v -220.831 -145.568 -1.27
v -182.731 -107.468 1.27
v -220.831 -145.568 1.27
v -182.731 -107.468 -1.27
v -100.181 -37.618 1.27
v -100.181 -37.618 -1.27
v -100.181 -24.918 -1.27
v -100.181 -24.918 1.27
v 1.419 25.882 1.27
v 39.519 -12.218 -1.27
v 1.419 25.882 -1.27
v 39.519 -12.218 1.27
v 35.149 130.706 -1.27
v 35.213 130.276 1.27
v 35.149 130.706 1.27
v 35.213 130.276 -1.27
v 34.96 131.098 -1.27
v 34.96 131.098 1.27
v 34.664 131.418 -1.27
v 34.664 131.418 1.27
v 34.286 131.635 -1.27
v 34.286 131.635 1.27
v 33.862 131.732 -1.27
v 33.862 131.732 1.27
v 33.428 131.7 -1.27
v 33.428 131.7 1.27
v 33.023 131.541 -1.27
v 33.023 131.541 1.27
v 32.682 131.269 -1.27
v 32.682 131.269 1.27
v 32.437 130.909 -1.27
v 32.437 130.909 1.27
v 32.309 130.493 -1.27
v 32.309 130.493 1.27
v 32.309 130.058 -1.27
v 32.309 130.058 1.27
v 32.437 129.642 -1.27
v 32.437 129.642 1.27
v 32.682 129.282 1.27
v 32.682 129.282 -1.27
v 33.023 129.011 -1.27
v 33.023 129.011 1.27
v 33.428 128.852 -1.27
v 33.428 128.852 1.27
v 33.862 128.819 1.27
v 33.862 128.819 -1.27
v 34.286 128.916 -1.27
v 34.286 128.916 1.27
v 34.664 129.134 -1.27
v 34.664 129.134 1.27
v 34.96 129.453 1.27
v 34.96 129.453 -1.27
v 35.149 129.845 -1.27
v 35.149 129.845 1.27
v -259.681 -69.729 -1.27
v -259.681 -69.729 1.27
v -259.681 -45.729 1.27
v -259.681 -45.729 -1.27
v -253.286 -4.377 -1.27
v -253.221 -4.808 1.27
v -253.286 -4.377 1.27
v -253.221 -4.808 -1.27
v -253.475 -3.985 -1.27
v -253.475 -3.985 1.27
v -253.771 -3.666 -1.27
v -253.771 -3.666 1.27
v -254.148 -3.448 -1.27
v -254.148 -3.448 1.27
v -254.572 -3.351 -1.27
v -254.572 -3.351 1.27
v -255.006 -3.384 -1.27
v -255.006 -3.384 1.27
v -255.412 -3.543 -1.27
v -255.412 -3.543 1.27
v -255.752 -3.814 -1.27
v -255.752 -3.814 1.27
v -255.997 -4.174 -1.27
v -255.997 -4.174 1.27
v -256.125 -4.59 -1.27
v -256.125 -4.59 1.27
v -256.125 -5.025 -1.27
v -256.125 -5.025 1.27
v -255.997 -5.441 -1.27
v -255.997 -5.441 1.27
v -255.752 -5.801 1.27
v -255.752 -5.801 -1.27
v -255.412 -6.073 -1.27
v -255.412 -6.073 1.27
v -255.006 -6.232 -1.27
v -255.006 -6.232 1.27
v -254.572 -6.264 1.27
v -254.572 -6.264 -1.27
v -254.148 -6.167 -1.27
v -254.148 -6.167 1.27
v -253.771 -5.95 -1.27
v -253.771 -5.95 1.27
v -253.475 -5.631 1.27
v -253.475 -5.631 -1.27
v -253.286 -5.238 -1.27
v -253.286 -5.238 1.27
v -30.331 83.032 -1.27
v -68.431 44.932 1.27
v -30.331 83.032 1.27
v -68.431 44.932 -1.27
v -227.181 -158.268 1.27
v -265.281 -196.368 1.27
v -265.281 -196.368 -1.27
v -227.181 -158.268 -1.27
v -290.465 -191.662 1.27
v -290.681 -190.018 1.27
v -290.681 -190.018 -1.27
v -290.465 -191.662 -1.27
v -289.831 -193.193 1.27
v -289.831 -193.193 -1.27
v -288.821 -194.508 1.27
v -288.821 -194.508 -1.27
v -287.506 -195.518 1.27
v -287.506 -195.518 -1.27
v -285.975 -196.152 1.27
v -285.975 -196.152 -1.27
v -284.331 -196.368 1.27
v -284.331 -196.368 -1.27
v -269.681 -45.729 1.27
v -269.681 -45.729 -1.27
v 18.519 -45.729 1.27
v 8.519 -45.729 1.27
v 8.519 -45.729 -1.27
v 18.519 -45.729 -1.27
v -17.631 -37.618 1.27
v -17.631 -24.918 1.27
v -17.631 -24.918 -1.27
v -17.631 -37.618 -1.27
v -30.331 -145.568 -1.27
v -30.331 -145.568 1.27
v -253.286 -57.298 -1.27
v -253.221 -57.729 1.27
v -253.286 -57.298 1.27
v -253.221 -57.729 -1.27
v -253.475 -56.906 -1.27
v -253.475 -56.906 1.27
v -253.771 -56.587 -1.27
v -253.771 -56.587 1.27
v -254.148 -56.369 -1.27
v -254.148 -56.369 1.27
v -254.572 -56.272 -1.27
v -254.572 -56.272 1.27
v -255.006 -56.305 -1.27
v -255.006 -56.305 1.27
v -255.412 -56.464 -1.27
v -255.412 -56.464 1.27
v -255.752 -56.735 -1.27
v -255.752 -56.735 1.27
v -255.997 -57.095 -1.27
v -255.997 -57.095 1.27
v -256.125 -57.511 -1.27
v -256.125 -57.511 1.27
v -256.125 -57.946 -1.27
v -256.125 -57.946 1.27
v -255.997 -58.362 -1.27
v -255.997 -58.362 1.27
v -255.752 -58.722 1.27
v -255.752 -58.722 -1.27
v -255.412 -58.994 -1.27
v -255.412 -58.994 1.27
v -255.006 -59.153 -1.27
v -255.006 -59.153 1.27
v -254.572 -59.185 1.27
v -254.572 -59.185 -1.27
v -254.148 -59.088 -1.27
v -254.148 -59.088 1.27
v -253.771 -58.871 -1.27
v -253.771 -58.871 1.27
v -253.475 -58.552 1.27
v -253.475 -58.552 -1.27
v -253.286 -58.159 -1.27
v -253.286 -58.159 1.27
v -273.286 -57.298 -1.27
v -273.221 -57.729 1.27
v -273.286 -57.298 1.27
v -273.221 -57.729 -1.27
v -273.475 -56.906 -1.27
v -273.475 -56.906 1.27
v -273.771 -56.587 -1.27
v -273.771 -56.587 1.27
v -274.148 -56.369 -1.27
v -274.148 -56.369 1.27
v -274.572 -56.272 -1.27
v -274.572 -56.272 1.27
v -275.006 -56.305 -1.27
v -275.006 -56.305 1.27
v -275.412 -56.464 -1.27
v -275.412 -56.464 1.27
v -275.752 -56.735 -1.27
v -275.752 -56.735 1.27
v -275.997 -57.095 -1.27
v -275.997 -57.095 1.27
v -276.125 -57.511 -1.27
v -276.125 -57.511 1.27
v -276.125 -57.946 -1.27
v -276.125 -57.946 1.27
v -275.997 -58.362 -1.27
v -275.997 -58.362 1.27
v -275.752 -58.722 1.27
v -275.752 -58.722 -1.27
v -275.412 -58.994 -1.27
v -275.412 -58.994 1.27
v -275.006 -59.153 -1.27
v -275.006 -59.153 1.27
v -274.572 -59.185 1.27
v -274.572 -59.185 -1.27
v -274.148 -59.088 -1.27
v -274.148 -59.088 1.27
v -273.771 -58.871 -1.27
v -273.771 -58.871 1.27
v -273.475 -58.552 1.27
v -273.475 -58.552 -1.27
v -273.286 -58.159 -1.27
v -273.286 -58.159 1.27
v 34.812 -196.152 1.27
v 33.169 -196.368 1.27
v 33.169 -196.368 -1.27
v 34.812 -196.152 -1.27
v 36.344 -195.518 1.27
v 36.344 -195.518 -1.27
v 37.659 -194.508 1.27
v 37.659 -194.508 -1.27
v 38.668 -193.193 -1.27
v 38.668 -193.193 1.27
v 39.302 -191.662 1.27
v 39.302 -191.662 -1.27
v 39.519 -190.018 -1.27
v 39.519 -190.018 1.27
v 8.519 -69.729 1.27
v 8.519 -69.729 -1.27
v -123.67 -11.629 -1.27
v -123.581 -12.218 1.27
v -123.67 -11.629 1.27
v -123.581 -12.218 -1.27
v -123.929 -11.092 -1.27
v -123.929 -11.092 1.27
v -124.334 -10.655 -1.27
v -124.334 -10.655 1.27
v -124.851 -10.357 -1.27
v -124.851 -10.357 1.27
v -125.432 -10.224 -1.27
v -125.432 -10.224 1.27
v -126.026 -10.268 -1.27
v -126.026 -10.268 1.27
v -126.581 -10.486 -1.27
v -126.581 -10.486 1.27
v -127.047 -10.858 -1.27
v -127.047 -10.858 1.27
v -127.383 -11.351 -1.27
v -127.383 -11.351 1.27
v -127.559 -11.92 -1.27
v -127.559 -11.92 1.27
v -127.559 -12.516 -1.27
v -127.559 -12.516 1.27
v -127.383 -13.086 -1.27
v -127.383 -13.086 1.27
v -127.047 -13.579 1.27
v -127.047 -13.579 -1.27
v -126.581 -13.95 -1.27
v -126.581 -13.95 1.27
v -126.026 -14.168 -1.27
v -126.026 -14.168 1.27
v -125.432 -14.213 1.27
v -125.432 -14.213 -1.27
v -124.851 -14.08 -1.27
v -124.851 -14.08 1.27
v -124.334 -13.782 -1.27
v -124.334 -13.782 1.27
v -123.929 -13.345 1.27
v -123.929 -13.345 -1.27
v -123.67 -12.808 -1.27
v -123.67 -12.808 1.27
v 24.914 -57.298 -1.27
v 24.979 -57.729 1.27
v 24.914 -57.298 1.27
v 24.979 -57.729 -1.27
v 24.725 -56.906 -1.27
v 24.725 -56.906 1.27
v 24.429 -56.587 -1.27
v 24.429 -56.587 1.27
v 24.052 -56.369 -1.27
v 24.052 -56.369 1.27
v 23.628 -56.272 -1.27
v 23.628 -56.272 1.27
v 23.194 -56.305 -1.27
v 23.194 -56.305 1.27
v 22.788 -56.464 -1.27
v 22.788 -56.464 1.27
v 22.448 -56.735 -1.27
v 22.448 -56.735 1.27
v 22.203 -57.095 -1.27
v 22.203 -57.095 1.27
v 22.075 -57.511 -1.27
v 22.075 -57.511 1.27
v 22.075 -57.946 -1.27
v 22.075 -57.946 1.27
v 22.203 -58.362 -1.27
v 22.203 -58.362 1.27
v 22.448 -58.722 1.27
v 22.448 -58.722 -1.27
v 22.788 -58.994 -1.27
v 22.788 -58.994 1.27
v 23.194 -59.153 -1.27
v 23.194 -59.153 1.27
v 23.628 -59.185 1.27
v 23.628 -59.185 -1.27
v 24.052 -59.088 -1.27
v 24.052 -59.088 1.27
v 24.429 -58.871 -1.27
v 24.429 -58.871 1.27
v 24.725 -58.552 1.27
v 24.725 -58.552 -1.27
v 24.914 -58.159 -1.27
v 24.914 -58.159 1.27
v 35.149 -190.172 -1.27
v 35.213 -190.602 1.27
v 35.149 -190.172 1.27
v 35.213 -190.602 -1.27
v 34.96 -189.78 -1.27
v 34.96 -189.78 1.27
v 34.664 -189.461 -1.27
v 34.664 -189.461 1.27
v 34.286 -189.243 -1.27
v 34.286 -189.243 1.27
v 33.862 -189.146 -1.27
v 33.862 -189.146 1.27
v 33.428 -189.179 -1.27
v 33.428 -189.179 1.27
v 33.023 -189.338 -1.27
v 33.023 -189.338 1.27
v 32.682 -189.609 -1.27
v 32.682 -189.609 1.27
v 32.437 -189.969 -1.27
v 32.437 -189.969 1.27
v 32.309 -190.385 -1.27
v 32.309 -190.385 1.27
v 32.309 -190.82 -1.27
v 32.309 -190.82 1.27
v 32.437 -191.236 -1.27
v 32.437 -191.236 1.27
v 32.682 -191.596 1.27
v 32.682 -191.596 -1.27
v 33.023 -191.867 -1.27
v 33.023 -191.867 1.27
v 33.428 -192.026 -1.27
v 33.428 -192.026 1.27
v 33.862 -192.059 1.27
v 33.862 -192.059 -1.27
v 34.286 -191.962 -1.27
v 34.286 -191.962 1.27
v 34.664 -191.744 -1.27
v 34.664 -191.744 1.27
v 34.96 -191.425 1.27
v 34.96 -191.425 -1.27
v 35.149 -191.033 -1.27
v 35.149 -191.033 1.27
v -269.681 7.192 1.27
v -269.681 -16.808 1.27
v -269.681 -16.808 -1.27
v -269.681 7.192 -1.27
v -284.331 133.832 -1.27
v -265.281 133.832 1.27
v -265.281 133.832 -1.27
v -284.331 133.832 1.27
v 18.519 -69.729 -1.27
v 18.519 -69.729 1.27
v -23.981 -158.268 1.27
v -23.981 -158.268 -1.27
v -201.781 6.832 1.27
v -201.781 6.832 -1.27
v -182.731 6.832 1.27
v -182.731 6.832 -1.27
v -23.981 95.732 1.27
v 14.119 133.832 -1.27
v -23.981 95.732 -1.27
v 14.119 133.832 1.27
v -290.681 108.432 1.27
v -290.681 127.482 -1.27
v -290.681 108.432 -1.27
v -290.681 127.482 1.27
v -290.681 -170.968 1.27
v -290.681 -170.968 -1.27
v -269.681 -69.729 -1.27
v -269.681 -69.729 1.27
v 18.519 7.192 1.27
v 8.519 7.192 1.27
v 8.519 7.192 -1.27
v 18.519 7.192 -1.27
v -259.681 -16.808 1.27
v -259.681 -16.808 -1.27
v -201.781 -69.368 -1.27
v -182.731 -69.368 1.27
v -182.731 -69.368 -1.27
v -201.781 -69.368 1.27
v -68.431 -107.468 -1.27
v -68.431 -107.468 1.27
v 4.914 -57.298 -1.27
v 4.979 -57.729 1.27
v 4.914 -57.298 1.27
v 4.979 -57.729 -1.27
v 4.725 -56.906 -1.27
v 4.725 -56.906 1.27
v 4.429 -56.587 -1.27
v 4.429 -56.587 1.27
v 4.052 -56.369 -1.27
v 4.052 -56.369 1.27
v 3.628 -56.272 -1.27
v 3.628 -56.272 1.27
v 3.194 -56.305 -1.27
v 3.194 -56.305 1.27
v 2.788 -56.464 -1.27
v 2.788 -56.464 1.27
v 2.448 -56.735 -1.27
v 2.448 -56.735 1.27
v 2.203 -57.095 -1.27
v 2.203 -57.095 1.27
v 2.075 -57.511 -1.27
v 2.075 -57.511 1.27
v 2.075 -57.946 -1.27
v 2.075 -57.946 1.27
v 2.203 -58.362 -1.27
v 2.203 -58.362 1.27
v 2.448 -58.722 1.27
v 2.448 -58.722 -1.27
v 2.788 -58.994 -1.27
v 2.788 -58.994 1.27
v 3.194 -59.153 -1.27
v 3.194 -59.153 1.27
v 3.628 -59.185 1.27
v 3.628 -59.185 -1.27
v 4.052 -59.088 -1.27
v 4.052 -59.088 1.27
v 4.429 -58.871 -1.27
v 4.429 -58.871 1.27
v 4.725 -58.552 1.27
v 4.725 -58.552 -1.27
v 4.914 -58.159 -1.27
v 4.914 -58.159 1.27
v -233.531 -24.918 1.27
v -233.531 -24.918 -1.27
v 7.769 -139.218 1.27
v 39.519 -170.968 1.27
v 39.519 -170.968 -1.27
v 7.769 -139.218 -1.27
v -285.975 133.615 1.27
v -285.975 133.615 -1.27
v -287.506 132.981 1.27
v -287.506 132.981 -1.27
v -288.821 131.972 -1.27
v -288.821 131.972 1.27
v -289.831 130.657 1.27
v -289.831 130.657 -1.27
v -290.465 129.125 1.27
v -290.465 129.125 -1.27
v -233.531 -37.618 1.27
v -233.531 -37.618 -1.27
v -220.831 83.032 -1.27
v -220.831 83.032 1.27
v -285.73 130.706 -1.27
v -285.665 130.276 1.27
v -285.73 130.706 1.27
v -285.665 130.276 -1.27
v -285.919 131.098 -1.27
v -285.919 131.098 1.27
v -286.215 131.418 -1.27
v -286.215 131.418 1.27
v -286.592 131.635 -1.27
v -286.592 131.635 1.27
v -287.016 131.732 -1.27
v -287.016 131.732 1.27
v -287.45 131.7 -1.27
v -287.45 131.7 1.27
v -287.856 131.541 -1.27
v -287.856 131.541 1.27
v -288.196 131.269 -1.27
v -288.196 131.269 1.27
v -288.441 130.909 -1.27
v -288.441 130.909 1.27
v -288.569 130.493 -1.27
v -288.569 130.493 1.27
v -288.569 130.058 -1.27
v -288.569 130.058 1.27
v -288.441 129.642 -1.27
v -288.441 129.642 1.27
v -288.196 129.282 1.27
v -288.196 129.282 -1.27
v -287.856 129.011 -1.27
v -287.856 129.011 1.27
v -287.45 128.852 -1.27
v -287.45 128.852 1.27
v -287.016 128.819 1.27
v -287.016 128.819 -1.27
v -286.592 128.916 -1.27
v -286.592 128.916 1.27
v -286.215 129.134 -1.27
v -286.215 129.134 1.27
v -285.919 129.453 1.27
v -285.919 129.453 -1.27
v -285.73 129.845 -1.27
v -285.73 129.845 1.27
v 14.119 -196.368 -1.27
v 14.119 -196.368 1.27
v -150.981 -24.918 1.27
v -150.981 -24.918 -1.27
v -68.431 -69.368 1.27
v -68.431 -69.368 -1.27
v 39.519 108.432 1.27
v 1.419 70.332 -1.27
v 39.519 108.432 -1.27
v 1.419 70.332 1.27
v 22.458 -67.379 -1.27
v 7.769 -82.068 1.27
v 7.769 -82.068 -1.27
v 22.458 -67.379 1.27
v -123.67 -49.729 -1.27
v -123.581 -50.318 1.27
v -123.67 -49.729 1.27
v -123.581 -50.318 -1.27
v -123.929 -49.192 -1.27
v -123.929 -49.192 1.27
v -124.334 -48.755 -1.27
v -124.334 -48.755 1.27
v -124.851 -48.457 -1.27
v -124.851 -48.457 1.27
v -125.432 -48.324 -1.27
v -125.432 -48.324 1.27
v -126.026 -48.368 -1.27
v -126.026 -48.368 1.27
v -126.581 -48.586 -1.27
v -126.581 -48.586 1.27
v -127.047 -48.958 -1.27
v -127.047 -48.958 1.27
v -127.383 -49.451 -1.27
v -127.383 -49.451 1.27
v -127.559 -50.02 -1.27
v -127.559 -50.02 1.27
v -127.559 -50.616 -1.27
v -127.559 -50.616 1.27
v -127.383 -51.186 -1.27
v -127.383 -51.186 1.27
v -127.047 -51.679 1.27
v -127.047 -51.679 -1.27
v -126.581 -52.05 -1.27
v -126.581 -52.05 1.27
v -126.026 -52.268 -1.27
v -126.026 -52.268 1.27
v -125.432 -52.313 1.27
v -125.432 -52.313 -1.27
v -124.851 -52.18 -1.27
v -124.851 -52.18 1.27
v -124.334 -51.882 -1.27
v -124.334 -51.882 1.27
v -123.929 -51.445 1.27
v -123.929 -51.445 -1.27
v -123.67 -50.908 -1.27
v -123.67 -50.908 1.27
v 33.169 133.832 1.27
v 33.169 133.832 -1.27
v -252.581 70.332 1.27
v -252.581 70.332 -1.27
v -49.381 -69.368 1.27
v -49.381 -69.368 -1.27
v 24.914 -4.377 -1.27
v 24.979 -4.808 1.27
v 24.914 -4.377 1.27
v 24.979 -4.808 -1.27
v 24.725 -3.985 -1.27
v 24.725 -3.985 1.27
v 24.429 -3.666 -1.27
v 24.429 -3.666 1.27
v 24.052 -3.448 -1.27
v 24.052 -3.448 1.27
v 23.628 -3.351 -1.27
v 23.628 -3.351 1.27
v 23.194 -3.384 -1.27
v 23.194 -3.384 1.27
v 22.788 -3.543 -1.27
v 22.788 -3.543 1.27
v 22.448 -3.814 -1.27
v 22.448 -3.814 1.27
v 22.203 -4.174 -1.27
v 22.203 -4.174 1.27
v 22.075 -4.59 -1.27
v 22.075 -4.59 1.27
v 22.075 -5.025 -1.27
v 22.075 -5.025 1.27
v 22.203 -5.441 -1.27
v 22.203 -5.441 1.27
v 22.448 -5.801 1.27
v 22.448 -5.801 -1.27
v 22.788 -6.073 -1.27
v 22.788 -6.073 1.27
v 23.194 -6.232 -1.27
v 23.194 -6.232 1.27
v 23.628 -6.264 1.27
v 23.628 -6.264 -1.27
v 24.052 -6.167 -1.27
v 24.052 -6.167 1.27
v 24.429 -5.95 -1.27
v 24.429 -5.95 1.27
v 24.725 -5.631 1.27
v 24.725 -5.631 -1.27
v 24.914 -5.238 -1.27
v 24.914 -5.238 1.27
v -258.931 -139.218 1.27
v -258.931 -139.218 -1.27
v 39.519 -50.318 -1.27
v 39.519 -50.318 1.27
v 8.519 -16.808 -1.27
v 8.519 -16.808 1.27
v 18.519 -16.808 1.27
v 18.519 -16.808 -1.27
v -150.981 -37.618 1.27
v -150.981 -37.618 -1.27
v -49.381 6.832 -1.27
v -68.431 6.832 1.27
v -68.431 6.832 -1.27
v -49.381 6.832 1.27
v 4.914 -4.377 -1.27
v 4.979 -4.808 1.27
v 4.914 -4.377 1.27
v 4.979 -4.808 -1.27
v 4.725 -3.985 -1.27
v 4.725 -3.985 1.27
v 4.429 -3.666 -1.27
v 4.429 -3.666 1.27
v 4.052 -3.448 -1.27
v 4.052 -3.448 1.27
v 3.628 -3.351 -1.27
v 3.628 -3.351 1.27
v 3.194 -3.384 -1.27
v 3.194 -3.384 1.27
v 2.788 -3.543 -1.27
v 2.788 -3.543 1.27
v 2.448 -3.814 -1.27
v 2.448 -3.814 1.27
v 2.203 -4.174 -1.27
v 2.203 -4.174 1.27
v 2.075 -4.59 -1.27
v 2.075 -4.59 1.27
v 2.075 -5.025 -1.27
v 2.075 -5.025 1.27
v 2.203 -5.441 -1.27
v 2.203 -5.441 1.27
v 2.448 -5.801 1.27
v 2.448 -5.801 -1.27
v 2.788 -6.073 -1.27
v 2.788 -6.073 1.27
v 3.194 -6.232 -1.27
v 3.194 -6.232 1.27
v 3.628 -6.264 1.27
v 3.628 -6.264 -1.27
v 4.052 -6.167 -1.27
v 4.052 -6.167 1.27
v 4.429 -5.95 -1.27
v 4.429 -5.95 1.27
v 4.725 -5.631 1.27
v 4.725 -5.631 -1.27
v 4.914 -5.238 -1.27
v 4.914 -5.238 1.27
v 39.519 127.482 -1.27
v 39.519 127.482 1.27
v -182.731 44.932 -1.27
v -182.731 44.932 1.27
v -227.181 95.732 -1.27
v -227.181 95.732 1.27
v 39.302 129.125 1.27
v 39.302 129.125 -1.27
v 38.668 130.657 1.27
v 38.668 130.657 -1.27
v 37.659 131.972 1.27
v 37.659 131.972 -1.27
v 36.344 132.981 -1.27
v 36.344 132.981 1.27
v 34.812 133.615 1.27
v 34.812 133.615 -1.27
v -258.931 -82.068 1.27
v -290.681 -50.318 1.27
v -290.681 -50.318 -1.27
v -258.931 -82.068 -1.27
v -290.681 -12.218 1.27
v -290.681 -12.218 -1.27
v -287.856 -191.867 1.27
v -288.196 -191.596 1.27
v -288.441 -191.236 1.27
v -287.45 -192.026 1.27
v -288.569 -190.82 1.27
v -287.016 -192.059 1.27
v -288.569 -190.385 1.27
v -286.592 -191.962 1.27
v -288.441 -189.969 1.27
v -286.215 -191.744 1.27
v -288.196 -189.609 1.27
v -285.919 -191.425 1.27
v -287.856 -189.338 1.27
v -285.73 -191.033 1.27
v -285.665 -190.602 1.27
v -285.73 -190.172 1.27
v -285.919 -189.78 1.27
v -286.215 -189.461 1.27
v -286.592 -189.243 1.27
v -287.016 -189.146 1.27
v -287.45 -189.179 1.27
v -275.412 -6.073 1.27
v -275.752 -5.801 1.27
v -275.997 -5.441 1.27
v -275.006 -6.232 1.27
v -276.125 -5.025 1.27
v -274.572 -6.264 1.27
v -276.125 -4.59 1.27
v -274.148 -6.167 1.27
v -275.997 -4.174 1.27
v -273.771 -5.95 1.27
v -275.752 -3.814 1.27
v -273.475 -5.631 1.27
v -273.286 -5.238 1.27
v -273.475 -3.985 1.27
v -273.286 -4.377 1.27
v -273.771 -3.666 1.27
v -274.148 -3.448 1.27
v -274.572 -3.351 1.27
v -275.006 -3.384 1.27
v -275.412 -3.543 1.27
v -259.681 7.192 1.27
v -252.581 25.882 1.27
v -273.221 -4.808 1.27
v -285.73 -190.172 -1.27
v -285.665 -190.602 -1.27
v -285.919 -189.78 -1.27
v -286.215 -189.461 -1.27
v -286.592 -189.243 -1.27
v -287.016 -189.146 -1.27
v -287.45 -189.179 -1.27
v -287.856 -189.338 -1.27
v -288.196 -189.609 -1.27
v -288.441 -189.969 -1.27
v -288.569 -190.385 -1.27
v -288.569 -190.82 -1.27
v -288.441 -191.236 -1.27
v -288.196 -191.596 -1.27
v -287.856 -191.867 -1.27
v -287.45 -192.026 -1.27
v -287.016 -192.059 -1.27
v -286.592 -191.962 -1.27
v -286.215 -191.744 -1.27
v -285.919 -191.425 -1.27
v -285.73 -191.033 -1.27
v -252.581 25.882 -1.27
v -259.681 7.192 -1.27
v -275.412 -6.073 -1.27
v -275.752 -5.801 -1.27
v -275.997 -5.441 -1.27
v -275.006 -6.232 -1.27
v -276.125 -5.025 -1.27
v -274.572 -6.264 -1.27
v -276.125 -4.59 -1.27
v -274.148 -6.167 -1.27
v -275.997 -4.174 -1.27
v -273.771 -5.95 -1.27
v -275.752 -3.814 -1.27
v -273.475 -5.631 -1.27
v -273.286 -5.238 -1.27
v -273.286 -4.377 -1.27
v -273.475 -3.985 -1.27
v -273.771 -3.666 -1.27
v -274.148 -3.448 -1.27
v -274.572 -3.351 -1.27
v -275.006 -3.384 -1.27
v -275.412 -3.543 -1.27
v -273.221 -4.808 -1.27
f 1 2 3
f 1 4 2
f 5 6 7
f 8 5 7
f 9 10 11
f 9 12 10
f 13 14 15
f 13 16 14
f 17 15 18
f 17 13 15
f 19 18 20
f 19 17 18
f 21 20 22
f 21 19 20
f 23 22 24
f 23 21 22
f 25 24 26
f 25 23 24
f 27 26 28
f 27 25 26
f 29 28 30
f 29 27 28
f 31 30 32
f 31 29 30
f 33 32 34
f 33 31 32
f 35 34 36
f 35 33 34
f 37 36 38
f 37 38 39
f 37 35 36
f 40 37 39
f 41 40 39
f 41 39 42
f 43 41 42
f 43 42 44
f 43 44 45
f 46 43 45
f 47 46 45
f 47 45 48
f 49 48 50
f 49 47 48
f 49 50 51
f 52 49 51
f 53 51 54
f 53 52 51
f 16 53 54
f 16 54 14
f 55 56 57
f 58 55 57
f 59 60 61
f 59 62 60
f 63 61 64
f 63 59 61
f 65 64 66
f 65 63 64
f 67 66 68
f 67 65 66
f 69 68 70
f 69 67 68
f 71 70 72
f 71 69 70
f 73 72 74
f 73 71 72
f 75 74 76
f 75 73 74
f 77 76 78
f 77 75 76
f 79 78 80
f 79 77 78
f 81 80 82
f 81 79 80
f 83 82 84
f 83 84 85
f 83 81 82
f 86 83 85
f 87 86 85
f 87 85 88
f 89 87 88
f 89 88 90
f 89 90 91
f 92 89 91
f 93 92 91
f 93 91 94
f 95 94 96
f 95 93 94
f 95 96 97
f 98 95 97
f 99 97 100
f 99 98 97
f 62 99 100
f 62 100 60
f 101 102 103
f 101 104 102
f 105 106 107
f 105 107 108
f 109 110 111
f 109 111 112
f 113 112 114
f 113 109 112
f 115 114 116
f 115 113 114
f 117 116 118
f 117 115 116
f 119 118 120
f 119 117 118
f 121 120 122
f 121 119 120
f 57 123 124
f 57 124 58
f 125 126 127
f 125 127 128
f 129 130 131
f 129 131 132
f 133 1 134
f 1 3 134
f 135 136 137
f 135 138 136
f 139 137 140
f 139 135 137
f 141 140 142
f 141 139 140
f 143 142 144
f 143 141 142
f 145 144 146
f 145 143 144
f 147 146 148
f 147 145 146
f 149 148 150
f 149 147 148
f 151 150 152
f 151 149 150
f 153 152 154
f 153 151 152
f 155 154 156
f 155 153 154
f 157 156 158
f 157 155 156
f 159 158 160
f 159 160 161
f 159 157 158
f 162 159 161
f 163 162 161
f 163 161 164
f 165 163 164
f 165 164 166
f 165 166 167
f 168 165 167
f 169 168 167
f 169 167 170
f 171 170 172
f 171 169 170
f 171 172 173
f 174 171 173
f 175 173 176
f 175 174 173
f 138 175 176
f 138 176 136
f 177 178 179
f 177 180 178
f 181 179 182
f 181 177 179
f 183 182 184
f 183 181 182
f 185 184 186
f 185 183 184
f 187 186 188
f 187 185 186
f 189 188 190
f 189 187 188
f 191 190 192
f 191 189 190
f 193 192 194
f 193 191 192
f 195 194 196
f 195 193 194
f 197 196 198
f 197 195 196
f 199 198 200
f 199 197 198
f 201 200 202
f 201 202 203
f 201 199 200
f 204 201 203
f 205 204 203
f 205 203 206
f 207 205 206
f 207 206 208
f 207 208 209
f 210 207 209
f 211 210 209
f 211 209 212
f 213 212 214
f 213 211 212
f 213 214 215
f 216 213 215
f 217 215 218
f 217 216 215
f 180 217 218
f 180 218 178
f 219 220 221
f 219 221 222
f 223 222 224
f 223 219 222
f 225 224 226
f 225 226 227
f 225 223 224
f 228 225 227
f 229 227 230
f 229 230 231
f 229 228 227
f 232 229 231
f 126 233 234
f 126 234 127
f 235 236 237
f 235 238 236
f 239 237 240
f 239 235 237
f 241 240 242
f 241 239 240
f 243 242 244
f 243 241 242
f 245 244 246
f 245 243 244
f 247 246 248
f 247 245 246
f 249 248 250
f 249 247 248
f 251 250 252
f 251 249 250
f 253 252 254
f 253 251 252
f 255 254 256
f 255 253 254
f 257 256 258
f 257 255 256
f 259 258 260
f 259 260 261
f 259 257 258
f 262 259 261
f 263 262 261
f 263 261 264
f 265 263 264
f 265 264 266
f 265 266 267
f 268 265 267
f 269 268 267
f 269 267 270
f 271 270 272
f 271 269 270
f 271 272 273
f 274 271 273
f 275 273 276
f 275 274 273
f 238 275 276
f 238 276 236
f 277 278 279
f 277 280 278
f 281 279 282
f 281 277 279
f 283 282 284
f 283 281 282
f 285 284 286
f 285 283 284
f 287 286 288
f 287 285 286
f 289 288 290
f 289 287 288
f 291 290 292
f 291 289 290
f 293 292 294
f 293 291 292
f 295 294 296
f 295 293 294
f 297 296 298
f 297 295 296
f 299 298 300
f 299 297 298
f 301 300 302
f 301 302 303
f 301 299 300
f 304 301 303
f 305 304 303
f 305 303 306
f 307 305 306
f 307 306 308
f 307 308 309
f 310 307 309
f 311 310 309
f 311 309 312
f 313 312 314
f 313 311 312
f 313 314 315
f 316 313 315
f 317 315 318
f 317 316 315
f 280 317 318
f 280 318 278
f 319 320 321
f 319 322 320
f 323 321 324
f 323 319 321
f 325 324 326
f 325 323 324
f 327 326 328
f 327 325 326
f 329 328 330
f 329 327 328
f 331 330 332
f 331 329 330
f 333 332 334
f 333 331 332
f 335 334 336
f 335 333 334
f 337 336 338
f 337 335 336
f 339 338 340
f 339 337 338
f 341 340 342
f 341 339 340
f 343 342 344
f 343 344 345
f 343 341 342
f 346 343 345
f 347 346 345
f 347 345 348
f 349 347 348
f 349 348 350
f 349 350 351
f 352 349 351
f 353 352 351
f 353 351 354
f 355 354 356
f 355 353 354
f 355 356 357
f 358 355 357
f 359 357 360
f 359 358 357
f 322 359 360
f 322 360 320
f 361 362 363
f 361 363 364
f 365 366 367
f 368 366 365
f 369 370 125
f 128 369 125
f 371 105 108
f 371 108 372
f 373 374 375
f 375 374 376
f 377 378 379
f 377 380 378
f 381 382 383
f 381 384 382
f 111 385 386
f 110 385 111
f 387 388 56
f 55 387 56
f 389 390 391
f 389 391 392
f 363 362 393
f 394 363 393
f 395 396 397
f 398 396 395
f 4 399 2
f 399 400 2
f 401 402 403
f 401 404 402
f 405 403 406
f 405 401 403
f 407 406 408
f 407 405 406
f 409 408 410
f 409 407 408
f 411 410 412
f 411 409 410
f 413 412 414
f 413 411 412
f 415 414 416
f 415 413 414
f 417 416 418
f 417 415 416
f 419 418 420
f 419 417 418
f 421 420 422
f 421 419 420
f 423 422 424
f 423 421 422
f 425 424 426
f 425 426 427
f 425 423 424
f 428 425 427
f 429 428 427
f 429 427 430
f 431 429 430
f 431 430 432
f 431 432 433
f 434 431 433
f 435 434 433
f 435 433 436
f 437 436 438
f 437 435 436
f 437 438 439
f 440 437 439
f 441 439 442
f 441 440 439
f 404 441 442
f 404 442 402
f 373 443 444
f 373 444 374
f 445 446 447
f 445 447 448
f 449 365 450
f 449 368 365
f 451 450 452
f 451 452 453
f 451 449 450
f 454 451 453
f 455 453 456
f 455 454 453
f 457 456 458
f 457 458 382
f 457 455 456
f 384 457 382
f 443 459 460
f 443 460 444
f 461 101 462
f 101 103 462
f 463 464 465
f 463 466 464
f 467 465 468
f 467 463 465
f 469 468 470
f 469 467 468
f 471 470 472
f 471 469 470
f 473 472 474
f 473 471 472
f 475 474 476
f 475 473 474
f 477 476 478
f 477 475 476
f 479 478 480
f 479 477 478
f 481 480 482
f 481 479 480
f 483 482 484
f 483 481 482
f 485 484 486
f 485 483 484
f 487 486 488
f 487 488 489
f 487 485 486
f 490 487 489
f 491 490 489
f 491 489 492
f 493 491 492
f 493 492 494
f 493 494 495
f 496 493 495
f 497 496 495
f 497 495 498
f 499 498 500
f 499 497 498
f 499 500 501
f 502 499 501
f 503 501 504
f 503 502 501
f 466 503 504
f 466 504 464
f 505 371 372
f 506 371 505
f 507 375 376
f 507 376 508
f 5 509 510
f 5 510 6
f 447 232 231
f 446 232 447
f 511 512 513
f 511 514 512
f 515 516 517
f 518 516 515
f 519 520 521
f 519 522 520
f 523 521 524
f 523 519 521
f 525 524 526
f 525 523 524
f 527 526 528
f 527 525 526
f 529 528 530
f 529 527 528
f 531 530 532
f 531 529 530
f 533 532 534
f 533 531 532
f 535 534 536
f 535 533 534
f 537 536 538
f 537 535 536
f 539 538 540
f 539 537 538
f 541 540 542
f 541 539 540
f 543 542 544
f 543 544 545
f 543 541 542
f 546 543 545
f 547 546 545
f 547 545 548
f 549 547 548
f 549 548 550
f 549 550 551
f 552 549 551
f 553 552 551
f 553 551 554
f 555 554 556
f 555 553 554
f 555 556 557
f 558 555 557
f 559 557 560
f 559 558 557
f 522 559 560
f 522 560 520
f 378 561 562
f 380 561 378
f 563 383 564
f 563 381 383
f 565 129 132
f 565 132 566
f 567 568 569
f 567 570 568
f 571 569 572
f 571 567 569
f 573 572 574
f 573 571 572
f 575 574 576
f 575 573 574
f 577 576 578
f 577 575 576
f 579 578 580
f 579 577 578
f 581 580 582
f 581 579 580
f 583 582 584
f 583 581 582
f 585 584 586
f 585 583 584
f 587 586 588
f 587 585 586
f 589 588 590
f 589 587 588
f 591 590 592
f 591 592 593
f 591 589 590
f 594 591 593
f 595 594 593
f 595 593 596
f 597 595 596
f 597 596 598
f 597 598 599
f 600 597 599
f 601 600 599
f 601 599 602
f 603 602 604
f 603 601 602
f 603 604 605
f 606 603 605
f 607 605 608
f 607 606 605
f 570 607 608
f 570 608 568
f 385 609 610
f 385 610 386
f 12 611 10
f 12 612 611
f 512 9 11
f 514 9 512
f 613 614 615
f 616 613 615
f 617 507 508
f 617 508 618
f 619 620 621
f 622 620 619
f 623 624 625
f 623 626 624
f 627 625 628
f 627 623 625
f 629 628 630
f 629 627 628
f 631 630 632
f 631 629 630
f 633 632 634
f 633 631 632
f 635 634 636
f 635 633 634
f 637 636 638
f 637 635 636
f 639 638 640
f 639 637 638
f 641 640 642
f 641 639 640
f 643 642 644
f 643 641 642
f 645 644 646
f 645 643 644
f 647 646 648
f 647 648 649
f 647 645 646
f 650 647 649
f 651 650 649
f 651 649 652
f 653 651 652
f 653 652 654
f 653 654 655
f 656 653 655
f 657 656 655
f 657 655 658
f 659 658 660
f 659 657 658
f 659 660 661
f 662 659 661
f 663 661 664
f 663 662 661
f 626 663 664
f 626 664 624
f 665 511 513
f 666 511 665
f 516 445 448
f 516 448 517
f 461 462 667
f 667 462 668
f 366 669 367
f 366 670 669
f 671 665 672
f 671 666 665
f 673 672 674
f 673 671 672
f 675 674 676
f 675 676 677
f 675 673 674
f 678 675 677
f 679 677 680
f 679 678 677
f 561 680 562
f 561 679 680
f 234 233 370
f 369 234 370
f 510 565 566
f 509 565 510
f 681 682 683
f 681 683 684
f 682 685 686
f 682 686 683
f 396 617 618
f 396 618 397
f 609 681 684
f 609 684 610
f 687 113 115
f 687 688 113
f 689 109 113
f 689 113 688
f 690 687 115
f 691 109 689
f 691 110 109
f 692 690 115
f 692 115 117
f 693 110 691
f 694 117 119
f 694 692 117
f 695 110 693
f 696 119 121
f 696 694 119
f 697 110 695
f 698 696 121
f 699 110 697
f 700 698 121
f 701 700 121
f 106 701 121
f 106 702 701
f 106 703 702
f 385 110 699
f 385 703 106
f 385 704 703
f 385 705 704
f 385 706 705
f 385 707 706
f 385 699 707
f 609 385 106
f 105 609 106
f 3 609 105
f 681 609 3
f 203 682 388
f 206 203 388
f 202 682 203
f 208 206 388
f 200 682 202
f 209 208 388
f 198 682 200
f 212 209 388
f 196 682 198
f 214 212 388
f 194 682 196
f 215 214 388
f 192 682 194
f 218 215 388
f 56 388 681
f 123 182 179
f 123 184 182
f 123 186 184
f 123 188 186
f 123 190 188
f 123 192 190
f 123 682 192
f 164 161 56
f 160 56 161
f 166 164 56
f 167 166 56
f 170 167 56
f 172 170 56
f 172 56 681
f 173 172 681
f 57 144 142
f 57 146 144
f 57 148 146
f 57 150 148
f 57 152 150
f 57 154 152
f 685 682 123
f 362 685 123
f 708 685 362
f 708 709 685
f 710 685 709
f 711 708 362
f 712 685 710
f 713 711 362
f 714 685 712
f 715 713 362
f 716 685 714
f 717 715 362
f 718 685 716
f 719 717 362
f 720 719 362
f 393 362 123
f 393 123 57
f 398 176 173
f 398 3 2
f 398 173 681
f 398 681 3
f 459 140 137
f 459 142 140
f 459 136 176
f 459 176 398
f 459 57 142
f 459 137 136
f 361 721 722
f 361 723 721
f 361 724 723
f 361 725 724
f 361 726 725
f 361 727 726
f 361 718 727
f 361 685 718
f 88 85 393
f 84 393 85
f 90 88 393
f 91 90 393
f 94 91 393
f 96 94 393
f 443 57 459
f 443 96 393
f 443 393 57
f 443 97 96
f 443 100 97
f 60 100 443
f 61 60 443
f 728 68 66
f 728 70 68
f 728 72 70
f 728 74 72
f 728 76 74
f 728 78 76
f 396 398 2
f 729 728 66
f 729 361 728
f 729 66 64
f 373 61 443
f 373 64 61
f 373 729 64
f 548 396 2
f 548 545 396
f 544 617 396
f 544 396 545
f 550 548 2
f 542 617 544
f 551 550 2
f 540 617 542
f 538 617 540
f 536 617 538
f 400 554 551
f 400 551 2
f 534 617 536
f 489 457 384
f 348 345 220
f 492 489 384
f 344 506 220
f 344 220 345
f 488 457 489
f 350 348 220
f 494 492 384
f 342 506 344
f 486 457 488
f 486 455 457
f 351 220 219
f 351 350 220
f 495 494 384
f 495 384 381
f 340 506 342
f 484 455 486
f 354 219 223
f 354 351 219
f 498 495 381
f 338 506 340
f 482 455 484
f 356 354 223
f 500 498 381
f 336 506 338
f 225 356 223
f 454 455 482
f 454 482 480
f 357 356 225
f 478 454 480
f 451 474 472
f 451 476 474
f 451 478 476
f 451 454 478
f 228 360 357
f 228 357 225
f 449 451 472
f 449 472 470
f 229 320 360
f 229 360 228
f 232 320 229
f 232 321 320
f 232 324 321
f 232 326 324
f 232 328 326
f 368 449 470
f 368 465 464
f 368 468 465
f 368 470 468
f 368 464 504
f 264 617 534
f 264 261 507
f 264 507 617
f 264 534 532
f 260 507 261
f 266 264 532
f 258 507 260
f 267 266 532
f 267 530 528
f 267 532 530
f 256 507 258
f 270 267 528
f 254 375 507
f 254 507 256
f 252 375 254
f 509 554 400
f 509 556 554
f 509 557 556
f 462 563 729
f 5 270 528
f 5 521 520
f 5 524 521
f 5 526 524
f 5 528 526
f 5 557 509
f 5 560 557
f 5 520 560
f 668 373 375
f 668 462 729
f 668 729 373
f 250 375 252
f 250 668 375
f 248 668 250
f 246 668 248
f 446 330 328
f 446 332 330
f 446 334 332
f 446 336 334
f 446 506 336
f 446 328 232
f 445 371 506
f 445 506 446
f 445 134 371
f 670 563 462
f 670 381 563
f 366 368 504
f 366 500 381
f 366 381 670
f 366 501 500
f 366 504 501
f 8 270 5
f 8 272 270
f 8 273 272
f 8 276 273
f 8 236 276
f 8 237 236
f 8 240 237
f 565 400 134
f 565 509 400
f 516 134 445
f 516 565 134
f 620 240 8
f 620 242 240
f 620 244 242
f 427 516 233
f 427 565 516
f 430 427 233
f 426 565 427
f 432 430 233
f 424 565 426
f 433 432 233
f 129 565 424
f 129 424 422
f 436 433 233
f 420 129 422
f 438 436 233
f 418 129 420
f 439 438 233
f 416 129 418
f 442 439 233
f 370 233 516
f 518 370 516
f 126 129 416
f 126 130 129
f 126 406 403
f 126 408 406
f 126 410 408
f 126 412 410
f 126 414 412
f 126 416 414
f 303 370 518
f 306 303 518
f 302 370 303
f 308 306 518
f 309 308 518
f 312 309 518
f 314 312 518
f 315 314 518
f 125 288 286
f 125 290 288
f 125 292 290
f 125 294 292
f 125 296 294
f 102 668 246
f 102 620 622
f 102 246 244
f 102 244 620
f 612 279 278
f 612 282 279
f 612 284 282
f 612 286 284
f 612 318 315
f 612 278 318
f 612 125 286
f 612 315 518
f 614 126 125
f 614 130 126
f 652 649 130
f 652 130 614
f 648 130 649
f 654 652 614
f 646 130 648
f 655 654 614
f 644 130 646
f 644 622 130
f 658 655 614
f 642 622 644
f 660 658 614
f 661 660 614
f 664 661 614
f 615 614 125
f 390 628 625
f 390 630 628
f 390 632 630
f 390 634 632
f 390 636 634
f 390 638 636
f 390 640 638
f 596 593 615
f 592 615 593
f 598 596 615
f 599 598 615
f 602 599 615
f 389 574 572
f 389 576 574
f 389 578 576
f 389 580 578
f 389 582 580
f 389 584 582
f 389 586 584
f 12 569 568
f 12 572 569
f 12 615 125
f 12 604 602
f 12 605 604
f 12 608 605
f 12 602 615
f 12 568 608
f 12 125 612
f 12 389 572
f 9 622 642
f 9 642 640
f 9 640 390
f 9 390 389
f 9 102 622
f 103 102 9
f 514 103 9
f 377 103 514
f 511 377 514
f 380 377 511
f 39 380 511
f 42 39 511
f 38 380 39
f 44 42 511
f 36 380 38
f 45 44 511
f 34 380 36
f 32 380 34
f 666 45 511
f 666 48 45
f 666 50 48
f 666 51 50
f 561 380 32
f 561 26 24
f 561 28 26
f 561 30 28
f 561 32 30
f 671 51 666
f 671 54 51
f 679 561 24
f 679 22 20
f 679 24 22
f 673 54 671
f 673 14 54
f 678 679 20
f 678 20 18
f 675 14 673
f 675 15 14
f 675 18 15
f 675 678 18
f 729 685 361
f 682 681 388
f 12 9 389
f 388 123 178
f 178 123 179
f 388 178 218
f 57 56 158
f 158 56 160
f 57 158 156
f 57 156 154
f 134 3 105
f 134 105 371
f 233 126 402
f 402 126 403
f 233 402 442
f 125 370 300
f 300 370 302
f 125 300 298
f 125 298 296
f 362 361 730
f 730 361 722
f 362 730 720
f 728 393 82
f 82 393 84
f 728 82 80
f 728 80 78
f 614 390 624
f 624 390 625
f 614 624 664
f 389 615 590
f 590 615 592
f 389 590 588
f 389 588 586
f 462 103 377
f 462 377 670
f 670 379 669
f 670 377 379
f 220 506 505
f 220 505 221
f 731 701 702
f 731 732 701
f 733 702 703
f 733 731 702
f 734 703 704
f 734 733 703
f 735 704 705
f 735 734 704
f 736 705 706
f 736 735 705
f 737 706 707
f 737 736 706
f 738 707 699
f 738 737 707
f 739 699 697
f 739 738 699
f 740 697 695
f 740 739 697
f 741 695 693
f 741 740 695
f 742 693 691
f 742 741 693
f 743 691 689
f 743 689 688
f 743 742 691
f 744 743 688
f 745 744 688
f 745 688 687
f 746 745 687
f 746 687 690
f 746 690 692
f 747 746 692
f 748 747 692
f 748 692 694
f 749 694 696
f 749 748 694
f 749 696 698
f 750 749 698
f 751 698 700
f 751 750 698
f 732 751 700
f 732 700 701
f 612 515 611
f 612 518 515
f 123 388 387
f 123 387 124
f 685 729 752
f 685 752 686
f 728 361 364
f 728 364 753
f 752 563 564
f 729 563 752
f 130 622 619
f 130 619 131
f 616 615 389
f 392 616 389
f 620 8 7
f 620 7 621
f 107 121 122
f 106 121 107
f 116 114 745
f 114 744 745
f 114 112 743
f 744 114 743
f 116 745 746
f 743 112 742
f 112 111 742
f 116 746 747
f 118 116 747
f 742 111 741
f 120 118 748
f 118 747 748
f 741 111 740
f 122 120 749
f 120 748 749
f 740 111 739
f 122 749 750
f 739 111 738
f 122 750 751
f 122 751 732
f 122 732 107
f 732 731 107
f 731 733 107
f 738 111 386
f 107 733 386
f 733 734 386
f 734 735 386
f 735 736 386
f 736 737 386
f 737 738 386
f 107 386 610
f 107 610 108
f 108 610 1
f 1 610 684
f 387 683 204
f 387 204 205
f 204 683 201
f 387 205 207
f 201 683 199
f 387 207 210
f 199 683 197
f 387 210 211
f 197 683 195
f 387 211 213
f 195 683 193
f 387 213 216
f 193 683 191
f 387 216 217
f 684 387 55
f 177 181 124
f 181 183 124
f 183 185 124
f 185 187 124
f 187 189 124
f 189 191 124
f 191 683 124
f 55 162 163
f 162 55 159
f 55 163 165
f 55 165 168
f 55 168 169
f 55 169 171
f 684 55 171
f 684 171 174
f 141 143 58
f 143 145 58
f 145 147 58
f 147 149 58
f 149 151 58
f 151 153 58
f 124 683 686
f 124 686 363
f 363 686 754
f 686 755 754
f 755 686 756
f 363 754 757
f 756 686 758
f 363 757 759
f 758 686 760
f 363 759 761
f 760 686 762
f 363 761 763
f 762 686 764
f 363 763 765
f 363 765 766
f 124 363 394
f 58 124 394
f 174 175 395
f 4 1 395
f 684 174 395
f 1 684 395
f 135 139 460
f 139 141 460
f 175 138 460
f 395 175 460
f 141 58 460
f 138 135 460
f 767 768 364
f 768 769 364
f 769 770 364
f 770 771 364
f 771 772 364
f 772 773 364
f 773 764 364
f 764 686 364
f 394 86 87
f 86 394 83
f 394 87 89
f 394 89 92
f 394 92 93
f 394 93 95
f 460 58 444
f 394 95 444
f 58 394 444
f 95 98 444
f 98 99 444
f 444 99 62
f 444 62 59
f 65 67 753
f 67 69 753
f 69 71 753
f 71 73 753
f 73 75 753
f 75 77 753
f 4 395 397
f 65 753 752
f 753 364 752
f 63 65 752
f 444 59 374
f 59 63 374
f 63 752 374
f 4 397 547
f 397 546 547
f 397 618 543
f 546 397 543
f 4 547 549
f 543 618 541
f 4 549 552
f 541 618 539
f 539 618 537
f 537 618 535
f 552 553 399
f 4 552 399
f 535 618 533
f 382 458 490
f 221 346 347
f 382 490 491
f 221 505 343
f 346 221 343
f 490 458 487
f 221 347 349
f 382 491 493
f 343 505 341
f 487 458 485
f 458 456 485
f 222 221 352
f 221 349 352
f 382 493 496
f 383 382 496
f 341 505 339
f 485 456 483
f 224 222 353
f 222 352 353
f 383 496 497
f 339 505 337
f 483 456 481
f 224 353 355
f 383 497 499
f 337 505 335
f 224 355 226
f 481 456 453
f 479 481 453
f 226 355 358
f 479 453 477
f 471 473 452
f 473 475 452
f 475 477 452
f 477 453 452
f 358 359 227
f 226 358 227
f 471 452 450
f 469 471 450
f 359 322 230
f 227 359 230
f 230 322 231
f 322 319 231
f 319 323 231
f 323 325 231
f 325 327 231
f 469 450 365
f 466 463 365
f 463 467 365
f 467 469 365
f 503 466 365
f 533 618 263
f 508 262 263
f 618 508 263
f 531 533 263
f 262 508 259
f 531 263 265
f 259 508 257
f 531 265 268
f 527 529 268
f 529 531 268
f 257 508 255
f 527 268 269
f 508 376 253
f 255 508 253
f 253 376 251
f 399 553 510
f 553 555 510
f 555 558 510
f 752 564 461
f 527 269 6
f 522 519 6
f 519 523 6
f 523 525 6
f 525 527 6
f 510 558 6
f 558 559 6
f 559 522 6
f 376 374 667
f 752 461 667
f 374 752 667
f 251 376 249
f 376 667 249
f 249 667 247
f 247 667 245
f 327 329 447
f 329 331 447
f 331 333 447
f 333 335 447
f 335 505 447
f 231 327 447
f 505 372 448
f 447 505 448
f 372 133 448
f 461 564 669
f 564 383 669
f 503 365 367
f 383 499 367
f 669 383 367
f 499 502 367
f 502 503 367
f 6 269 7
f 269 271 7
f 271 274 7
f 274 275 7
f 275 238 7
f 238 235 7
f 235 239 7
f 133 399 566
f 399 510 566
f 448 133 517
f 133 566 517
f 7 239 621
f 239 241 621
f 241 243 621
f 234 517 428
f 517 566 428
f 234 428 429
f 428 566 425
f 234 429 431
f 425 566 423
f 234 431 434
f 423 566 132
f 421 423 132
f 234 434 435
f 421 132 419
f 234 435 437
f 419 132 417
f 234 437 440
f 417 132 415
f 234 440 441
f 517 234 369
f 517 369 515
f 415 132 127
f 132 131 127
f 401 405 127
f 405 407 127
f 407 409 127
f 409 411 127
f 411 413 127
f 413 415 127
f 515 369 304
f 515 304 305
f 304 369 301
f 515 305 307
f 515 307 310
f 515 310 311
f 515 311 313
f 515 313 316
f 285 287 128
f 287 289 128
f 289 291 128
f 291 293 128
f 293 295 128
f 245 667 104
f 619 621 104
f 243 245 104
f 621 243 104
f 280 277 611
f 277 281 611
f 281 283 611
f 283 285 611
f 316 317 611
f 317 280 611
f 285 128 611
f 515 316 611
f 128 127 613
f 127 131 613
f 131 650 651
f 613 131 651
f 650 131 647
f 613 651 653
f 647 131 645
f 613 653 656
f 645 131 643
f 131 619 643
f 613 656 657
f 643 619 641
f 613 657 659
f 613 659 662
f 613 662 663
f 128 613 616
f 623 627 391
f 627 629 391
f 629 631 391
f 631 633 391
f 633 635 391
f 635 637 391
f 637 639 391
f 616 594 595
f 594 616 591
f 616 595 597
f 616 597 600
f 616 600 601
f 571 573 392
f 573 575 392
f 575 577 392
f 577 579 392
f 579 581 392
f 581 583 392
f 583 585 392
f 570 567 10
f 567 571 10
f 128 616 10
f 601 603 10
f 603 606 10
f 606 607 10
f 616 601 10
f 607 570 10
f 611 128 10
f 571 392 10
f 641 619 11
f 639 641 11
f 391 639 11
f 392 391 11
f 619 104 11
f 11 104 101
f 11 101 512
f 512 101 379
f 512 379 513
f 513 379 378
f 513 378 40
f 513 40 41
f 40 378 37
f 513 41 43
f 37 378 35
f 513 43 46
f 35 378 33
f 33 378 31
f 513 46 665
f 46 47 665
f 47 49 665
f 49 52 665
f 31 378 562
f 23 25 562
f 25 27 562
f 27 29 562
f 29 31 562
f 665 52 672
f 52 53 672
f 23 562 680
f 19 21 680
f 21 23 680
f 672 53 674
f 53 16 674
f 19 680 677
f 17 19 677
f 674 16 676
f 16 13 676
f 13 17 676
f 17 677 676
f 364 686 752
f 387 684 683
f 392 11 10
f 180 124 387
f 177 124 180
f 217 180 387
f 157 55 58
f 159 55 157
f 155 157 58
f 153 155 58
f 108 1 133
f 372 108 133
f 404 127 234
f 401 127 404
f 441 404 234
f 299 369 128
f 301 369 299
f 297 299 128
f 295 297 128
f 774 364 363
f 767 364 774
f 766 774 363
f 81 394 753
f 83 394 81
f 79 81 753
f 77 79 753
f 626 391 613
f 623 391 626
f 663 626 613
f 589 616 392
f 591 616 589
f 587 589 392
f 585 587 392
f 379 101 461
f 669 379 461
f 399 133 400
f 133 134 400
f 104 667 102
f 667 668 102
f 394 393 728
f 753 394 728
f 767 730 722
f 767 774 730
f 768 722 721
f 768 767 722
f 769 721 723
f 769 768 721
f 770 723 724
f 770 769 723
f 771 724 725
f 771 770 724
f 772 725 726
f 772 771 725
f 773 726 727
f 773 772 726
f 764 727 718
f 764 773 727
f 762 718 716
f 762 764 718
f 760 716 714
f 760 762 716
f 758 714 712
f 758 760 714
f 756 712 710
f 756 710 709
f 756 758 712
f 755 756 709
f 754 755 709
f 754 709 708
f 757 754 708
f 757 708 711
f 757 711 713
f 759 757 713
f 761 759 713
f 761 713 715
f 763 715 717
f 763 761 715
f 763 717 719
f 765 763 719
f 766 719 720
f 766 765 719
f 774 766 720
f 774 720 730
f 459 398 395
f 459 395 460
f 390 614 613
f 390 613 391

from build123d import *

# Parameters (mm, degrees)
MODEL_R             = 1.4605
MODEL_R_2           = 2
BOSS_EXTRUDE1_DEPTH = 1.27
SKETCH1_W           = 10
SKETCH1_H           = 24
CUT_EXTRUDE1_DEPTH  = 10


with BuildPart() as part:
    # Model → Boss-Extrude1 (new, symmetric)
    with BuildSketch(Plane.XY):
        with BuildLine():
            Line((-252.581304326, 70.3317), (-252.581304326, 25.8817))
            Line((-252.581304326, 25.8817), (-290.681304326, -12.2183))
            Line((-290.681304326, -12.2183), (-290.681304326, -50.3183))
            Line((-290.681304326, -50.3183), (-258.931304326, -82.0683))
            Line((-258.931304326, -82.0683), (-258.931304326, -139.2183))
            Line((-258.931304326, -139.2183), (-290.681304326, -170.9683))
            Line((-290.681304326, -170.9683), (-290.681304326, -190.0183))
            ThreePointArc((-290.681304326, -190.0183), (-288.821432386, -194.508428061), (-284.331304326, -196.3683))
            Line((-284.331304326, -196.3683), (-265.281304326, -196.3683))
            Line((-265.281304326, -196.3683), (-227.181304326, -158.2683))
            Line((-227.181304326, -158.2683), (-23.981304326, -158.2683))
            Line((-23.981304326, -158.2683), (14.118695674, -196.3683))
            Line((14.118695674, -196.3683), (33.168695674, -196.3683))
            ThreePointArc((33.168695674, -196.3683), (37.658823735, -194.508428061), (39.518695674, -190.0183))
            Line((39.518695674, -190.0183), (39.518695674, -170.9683))
            Line((39.518695674, -170.9683), (7.768695674, -139.2183))
            Line((7.768695674, -139.2183), (7.768695674, -82.0683))
            Line((7.768695674, -82.0683), (22.457936385, -67.37905929))
            Line((22.457936385, -67.37905929), (39.518695674, -50.3183))
            Line((39.518695674, -50.3183), (39.518695674, -12.2183))
            Line((39.518695674, -12.2183), (1.418695674, 25.8817))
            Line((1.418695674, 25.8817), (1.418695674, 70.3317))
            Line((1.418695674, 70.3317), (39.518695674, 108.4317))
            Line((39.518695674, 108.4317), (39.518695674, 127.4817))
            ThreePointArc((39.518695674, 127.4817), (37.658823735, 131.971828061), (33.168695674, 133.8317))
            Line((33.168695674, 133.8317), (14.118695674, 133.8317))
            Line((14.118695674, 133.8317), (-23.981304326, 95.7317))
            Line((-23.981304326, 95.7317), (-227.181304326, 95.7317))
            Line((-227.181304326, 95.7317), (-265.281304326, 133.8317))
            Line((-265.281304326, 133.8317), (-284.331304326, 133.8317))
            ThreePointArc((-284.331304326, 133.8317), (-288.821432386, 131.971828061), (-290.681304326, 127.4817))
            Line((-290.681304326, 127.4817), (-290.681304326, 108.4317))
            Line((-290.681304326, 108.4317), (-252.581304326, 70.3317))
        make_face()
        with Locations((-287.125304326, -190.6025)):
            Circle(MODEL_R, mode=Mode.SUBTRACT)
        with Locations((33.752895674, -190.6025)):
            Circle(MODEL_R, mode=Mode.SUBTRACT)
        with Locations((33.752895674, 130.2757)):
            Circle(MODEL_R, mode=Mode.SUBTRACT)
        with Locations((-287.125304326, 130.2757)):
            Circle(MODEL_R, mode=Mode.SUBTRACT)
        with Locations((-274.681304256, -57.7288)):
            Circle(MODEL_R, mode=Mode.SUBTRACT)
        with Locations((-254.681304256, -57.7288)):
            Circle(MODEL_R, mode=Mode.SUBTRACT)
        with Locations((23.518695604, -57.7288)):
            Circle(MODEL_R, mode=Mode.SUBTRACT)
        with Locations((3.518695604, -57.7288)):
            Circle(MODEL_R, mode=Mode.SUBTRACT)
        with Locations((23.518695604, -4.8078)):
            Circle(MODEL_R, mode=Mode.SUBTRACT)
        with Locations((3.518695604, -4.8078)):
            Circle(MODEL_R, mode=Mode.SUBTRACT)
        with Locations((-254.681304256, -4.8078)):
            Circle(MODEL_R, mode=Mode.SUBTRACT)
        with Locations((-274.681304256, -4.8078)):
            Circle(MODEL_R, mode=Mode.SUBTRACT)
        with Locations((-125.581304326, -12.2183)):
            Circle(MODEL_R_2, mode=Mode.SUBTRACT)
        with Locations((-125.581304326, -50.3183)):
            Circle(MODEL_R_2, mode=Mode.SUBTRACT)
        Polygon((-30.331304326, -145.5683), (-68.431304326, -107.4683), (-182.731304326, -107.4683), (-220.831304326, -145.5683), align=None, mode=Mode.SUBTRACT)
        Polygon((-220.831304326, 83.0317), (-182.731304326, 44.9317), (-68.431304326, 44.9317), (-30.331304326, 83.0317), align=None, mode=Mode.SUBTRACT)
        Polygon((-201.781304326, -69.3683), (-233.531304326, -37.6183), (-233.531304326, -24.9183), (-201.781304326, 6.8317), (-182.731304326, 6.8317), (-150.981304326, -24.9183), (-150.981304326, -37.6183), (-182.731304326, -69.3683), align=None, mode=Mode.SUBTRACT)
        Polygon((-100.181304326, -37.6183), (-100.181304326, -24.9183), (-68.431304326, 6.8317), (-49.381304326, 6.8317), (-17.631304326, -24.9183), (-17.631304326, -37.6183), (-49.381304326, -69.3683), (-68.431304326, -69.3683), align=None, mode=Mode.SUBTRACT)
    extrude(amount=BOSS_EXTRUDE1_DEPTH, both=True)

    # Sketch1 → Cut-Extrude1 (cut)
    with BuildSketch(Plane.XY.offset(1.27)):
        with Locations((-264.681304256, -57.7288)):
            Rectangle(SKETCH1_W, SKETCH1_H)
        with Locations((-264.681304256, -4.8078)):
            Rectangle(SKETCH1_W, SKETCH1_H)
        with Locations((13.518695604, -4.8078)):
            Rectangle(SKETCH1_W, SKETCH1_H)
        with Locations((13.518695604, -57.7288)):
            Rectangle(SKETCH1_W, SKETCH1_H)
    extrude(amount=-CUT_EXTRUDE1_DEPTH, mode=Mode.SUBTRACT)


solid = part.part
